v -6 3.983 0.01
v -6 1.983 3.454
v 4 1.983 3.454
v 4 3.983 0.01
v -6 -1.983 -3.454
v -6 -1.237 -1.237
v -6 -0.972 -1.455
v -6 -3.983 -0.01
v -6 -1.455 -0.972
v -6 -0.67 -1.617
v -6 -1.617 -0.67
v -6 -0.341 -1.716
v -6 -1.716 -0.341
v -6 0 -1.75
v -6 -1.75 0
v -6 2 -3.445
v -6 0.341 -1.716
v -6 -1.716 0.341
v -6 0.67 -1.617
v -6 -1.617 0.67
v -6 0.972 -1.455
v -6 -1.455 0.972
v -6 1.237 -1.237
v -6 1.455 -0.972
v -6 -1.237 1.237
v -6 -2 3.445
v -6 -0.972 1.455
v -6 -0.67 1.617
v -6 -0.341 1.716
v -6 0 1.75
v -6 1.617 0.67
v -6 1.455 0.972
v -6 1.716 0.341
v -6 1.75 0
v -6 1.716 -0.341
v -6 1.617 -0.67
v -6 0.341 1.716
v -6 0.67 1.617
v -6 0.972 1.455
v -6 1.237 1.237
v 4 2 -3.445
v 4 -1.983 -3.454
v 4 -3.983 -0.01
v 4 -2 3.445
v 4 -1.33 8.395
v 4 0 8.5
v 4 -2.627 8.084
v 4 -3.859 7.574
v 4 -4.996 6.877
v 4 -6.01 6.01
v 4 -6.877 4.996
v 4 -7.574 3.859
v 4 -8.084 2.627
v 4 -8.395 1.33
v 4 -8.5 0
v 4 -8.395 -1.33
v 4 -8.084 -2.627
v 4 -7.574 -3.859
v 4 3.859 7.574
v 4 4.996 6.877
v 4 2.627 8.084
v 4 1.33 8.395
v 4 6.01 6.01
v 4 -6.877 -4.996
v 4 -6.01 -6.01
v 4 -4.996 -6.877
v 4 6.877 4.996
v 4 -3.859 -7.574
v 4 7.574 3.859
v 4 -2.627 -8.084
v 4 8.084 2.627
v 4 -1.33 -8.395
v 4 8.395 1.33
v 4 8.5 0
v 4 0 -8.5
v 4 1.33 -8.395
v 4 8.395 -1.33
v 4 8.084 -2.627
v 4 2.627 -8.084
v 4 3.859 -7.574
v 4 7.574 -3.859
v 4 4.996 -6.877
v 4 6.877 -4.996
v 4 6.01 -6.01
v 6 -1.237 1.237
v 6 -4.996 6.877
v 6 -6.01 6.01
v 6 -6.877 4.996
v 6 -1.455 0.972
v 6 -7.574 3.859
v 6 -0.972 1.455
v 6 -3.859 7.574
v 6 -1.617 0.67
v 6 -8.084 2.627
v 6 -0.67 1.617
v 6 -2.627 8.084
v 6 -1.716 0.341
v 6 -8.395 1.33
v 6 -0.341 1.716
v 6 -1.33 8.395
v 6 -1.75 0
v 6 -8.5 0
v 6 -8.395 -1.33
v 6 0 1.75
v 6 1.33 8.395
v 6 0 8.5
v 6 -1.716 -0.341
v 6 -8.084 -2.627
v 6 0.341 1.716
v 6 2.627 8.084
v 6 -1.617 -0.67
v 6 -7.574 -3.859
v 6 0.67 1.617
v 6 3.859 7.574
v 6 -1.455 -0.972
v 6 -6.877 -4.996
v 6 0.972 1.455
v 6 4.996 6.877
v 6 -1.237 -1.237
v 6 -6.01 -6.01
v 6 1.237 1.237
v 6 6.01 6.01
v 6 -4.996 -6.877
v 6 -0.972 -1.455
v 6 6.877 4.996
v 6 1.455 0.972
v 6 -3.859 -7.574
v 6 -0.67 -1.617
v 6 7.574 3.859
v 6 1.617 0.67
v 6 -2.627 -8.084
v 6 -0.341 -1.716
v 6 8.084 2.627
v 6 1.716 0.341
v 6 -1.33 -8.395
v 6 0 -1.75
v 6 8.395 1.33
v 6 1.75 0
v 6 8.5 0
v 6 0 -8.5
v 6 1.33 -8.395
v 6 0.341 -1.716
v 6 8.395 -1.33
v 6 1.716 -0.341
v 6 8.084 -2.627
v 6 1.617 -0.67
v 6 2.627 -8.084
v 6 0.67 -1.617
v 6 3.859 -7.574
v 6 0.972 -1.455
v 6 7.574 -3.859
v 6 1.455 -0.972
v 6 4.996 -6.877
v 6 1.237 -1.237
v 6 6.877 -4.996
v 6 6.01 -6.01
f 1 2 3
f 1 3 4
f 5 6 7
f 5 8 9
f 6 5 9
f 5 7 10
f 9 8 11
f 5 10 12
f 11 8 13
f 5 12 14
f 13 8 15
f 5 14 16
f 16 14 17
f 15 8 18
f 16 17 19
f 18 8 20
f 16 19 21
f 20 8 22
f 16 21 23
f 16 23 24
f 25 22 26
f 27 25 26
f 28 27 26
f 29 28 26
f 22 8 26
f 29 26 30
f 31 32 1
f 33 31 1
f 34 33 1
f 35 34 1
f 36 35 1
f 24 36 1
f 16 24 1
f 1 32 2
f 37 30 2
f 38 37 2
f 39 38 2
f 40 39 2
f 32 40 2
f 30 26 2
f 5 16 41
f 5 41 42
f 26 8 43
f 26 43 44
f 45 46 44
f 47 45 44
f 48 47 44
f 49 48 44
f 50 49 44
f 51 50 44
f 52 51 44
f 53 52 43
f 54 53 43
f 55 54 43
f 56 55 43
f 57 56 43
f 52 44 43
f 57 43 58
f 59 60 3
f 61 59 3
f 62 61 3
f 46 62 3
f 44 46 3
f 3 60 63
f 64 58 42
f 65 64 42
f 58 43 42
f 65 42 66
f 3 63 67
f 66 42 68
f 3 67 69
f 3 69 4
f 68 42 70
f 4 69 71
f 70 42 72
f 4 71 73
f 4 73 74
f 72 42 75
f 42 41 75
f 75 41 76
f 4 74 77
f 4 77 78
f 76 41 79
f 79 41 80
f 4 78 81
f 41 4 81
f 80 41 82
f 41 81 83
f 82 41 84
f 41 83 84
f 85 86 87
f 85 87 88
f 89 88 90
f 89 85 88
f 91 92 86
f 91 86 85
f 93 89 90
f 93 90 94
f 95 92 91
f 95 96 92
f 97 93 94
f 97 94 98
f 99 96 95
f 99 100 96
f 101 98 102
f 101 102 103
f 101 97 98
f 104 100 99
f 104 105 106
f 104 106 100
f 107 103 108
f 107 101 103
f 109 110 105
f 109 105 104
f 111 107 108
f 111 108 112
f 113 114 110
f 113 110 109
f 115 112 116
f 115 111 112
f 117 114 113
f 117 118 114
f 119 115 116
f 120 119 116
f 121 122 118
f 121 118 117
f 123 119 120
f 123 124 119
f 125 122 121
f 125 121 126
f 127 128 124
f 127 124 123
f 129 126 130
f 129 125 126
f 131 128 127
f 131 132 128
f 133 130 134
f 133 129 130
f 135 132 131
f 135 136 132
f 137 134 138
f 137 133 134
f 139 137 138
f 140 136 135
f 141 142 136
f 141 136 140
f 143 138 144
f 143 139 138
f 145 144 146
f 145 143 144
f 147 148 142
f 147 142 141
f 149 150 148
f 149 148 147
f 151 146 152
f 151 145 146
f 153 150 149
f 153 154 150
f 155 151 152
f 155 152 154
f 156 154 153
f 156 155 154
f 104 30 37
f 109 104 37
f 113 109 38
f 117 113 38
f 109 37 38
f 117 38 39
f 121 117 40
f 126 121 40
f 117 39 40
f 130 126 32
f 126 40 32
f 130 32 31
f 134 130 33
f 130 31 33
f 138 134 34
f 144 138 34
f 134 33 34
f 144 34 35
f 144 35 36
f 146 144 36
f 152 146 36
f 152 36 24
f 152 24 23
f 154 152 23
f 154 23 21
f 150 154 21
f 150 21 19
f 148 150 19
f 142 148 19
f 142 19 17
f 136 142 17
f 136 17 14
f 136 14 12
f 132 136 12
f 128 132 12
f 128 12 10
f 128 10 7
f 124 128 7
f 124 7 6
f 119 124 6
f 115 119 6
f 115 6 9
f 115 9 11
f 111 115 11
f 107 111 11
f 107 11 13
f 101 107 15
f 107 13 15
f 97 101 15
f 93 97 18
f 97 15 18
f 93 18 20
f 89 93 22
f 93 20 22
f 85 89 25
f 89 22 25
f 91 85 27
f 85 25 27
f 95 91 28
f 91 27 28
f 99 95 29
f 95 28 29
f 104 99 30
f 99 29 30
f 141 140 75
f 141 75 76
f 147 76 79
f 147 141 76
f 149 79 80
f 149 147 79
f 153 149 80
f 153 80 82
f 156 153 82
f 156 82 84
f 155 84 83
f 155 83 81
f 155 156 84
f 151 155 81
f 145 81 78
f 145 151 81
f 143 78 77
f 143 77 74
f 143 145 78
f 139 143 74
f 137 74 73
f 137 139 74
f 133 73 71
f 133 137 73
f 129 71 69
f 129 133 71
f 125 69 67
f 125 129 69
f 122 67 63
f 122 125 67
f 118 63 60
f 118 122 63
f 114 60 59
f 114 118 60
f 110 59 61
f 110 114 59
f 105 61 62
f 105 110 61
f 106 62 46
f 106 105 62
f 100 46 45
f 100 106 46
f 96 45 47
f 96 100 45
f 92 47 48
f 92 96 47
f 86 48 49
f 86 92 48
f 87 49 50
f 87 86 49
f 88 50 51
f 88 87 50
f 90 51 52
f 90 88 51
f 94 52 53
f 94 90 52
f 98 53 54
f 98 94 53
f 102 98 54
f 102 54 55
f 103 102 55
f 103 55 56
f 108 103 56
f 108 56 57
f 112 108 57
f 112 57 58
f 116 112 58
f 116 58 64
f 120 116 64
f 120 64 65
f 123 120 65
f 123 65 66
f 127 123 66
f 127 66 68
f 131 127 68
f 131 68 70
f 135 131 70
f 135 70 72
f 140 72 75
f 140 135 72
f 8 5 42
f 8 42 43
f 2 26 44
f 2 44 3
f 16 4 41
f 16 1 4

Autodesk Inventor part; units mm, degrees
ref_plane "YZ Plane" through (0, 0, 0) normal (1, 0, 0) x (0, 1, 0)
ref_plane "XZ Plane" through (0, 0, 0) normal (0, 1, 0) x (-1, 0, 0)
ref_plane "XY Plane" through (0, 0, 0) normal (0, 0, 1) x (1, 0, 0)
sketch "Sketch1" plane through (0, 0, 0) normal (1, 0, 0) x (0, 1, 0)
  line L0 (2, 0) -> (-2, 0) construction
  line L1 (-2, 0) -> (-2, -15.7322) construction
  line L2 (-2, -15.7322) -> (2, -15.7322) construction
  line L3 (2, -15.7322) -> (2, 0) construction
  line L4 (2, -3.4446) -> (-1.9831, -3.4544)
  line L5 (-1.9831, -3.4544) -> (-3.9831, -0.0097)
  line L6 (-3.9831, -0.0097) -> (-2, 3.4446)
  line L7 (-2, 3.4446) -> (1.9831, 3.4544)
  line L8 (1.9831, 3.4544) -> (3.9831, 0.0097)
  line L9 (3.9831, 0.0097) -> (2, -3.4446)
  point P0 (0, 0)
  point P1 (0, 0)
  dimension "d0" = 4
extrude "Extrusion1" add sketch "Sketch1" along normal blind 4 and the other way blind 6
sketch "Sketch2" plane through (4, 0, 0) normal (1, 0, 0) x (0, 0, -1)
  line L0 (3.4446, 2) -> (-0.0097, 3.9831) projected
  circle A0 centre (0, 0) radius 3.9832
extrude "Extrusion2" add sketch "Sketch2" along normal blind 2
sketch "Sketch3" plane through (6, 0, 0) normal (1, 0, 0) x (0, 0, -1)
  point P0 (0, 0)
sketch "Sketch4" plane through (4, 0, 0) normal (-1, 0, 0) x (0, 0, 1)
  circle A0 centre (0, 0) radius 6
  dimension "d5" = 12
extrude "Extrusion3" add sketch "Sketch4" against normal blind 2
sketch "Sketch5" plane through (6, 0, 0) normal (1, 0, 0) x (0, 0, -1)
  circle A0 centre (0, 0) radius 1.5
  dimension "d8" = 3
extrude "Extrusion4" cut sketch "Sketch5" against normal blind 6
sketch "Sketch6" plane through (6, 0, 0) normal (1, 0, 0) x (0, 0, -1)
  point P0 (0, 0)
sketch "Sketch7" plane through (6, 0, 0) normal (1, 0, 0) x (0, 0, -1)
  circle A0 centre (0, 0) radius 8.5
  dimension "d11" = 17
extrude "Extrusion5" add sketch "Sketch7" against normal blind 2
sketch "Sketch8" plane through (-6, 0, 0) normal (-1, 0, 0) x (0, 0, 1)
  circle A0 centre (0, 0) radius 1.75
  dimension "d16" = 3.5
extrude "Extrusion6" cut sketch "Sketch8" against normal blind 12.25
properties part number "InnerLayerHub3mm"
